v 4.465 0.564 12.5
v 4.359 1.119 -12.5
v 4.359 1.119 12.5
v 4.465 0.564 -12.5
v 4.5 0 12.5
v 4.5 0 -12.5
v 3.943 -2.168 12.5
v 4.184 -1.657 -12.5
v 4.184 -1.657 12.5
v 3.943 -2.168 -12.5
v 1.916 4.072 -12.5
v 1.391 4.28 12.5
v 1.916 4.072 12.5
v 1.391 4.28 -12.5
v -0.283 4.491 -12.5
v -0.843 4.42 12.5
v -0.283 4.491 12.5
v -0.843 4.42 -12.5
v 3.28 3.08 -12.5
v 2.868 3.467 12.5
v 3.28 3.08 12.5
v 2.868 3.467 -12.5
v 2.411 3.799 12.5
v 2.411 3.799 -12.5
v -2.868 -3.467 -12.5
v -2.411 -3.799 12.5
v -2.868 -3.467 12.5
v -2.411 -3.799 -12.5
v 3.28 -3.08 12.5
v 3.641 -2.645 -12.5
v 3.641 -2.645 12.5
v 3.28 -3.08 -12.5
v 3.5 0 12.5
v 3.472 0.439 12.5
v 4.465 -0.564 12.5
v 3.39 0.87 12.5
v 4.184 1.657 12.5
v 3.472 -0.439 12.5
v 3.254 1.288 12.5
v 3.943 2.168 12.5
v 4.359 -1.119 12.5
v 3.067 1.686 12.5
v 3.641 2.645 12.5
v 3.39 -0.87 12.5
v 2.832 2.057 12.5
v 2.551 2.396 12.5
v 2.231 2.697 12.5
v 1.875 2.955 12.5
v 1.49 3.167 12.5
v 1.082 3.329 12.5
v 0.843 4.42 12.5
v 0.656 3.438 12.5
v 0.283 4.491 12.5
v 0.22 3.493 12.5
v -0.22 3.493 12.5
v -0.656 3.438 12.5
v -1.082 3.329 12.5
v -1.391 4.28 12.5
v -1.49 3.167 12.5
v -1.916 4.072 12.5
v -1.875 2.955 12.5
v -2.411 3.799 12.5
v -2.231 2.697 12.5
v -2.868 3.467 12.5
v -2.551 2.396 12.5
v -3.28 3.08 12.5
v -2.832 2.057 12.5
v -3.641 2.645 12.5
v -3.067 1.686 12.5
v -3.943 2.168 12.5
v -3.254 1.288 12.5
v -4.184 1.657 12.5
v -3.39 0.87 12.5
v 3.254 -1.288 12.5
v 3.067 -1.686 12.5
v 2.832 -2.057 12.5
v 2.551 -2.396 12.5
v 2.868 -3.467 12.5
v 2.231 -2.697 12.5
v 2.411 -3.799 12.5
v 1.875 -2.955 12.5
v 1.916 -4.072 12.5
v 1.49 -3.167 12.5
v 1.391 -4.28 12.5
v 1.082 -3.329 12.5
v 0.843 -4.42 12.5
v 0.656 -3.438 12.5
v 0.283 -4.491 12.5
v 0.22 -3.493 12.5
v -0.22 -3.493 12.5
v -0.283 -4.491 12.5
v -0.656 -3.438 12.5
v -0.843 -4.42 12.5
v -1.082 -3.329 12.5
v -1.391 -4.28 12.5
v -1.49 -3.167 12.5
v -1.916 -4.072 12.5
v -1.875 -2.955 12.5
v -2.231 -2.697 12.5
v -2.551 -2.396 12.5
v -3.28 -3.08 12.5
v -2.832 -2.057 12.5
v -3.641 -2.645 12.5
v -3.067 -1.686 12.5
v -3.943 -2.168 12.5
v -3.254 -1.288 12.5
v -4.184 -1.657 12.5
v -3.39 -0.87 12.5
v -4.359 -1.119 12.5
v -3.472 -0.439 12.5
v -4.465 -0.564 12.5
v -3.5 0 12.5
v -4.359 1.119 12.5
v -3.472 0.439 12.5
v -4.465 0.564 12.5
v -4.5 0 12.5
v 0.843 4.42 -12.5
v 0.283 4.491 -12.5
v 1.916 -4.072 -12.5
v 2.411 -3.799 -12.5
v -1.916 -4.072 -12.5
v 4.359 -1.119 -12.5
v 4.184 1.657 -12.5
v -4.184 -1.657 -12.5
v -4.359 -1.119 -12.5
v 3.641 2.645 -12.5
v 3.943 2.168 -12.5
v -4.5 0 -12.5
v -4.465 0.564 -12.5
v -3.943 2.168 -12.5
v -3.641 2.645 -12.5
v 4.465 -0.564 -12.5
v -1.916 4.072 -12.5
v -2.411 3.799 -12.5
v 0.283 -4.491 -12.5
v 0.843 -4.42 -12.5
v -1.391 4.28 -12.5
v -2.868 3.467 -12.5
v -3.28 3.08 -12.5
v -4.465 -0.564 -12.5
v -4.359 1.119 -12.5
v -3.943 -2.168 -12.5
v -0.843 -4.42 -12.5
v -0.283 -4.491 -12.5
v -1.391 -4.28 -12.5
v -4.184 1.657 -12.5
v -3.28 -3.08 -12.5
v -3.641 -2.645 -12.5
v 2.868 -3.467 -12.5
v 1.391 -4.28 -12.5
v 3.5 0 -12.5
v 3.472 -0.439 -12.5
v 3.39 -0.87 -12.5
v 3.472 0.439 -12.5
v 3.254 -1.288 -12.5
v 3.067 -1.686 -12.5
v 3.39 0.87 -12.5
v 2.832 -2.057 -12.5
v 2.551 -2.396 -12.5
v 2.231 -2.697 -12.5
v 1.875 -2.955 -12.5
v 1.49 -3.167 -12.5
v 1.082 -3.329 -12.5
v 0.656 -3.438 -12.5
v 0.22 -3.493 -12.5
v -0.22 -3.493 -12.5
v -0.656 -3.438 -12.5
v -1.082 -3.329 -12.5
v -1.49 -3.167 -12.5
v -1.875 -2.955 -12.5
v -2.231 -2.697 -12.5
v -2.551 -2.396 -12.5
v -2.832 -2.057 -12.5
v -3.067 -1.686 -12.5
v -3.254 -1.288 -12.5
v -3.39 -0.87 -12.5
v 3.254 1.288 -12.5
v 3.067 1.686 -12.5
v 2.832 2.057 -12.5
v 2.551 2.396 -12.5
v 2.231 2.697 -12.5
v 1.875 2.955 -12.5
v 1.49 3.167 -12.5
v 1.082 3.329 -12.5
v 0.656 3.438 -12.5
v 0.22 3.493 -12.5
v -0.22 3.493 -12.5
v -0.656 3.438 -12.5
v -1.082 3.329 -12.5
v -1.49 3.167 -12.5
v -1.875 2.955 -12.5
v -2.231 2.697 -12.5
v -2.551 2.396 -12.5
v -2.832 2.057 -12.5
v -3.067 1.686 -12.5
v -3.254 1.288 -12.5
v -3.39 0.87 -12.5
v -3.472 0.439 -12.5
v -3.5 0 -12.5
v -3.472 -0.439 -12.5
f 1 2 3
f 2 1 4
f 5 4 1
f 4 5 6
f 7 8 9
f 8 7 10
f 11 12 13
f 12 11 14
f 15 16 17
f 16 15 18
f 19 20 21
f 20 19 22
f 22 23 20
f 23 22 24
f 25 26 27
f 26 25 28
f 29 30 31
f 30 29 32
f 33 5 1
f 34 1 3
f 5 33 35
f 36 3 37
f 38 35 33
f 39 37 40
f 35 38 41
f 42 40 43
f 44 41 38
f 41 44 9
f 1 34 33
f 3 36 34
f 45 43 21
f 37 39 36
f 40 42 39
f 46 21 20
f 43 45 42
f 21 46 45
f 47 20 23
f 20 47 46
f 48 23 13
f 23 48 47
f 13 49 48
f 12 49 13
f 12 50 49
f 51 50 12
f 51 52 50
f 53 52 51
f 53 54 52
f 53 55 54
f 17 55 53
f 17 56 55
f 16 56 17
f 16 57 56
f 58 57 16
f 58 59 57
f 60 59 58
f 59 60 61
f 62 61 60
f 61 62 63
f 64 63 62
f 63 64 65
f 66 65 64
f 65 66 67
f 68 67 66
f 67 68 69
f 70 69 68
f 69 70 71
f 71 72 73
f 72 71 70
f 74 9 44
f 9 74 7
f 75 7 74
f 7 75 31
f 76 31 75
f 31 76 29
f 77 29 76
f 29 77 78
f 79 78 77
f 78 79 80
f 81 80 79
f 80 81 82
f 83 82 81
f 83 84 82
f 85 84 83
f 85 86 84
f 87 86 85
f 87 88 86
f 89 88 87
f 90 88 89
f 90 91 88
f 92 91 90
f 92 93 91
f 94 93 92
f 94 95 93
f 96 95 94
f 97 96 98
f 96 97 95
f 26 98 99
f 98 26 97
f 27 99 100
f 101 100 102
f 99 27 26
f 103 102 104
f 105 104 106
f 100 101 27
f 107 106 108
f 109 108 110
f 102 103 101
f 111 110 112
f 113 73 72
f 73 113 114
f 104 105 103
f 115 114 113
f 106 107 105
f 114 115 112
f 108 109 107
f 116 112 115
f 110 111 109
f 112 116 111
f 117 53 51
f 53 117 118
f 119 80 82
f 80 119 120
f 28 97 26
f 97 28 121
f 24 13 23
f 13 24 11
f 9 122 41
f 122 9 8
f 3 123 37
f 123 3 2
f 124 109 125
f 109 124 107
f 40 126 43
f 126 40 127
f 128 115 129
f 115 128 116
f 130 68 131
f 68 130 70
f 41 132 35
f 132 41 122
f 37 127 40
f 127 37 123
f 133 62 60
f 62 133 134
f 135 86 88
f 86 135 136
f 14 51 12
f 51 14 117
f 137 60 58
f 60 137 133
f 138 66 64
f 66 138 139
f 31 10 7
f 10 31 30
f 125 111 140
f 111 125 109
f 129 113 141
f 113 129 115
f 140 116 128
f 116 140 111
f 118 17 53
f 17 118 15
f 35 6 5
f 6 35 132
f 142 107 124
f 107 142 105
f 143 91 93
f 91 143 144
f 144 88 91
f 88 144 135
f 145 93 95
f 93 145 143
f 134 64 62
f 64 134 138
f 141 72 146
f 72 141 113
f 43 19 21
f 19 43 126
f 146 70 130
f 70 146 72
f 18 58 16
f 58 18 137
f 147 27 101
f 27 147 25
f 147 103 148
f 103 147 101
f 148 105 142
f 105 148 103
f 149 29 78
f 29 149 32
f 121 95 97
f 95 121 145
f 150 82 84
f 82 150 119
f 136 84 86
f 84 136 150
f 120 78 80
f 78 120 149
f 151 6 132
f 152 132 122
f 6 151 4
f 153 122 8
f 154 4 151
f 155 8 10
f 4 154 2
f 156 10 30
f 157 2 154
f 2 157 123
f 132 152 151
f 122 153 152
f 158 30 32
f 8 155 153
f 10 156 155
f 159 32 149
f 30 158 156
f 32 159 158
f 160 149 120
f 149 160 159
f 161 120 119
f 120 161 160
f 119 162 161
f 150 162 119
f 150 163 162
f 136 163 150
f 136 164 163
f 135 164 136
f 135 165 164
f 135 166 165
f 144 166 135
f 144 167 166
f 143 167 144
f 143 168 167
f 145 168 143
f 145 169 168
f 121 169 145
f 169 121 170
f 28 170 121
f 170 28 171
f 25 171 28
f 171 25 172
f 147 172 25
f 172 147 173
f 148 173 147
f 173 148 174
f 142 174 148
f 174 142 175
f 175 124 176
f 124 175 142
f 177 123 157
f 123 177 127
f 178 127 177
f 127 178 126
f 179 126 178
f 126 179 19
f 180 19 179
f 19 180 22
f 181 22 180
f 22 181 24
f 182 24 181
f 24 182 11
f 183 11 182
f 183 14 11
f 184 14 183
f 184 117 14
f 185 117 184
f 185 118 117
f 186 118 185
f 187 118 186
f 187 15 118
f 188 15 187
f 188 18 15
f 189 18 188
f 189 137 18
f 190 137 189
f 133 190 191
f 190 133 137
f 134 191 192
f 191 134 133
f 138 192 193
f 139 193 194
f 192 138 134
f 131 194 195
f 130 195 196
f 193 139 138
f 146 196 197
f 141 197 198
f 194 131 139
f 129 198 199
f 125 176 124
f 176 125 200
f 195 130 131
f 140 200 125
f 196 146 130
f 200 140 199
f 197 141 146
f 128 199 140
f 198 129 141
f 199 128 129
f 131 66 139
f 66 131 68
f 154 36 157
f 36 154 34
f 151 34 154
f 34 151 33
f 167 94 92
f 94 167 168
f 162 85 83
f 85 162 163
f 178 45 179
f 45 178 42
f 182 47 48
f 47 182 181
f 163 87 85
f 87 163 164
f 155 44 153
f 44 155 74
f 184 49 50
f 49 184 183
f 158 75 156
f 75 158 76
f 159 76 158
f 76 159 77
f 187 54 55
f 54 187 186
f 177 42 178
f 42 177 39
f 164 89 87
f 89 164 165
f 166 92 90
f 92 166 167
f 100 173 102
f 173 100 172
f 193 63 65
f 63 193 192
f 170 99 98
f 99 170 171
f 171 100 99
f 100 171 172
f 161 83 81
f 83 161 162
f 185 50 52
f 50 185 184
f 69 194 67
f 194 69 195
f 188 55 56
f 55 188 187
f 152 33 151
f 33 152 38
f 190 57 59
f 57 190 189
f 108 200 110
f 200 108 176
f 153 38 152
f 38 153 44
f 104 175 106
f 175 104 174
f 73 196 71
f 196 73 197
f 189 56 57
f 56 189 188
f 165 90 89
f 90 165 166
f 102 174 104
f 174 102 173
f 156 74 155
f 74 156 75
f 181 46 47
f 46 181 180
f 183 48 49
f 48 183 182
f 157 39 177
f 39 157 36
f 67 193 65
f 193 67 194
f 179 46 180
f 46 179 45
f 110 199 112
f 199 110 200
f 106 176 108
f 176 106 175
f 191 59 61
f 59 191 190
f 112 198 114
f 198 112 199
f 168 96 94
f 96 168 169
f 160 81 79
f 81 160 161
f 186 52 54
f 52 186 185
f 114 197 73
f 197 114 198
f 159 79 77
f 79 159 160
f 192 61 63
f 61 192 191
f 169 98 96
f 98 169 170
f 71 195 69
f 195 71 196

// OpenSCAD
$fn = 50;


difference() {
	union() {
		translate(v = [0, 0, -12.5000000000]) {
			cylinder(h = 25, r = 4.5000000000);
		}
	}
	union() {
		translate(v = [0, 0, -100.0000000000]) {
			cylinder(h = 200, r = 3.5000000000);
		}
	}
}
